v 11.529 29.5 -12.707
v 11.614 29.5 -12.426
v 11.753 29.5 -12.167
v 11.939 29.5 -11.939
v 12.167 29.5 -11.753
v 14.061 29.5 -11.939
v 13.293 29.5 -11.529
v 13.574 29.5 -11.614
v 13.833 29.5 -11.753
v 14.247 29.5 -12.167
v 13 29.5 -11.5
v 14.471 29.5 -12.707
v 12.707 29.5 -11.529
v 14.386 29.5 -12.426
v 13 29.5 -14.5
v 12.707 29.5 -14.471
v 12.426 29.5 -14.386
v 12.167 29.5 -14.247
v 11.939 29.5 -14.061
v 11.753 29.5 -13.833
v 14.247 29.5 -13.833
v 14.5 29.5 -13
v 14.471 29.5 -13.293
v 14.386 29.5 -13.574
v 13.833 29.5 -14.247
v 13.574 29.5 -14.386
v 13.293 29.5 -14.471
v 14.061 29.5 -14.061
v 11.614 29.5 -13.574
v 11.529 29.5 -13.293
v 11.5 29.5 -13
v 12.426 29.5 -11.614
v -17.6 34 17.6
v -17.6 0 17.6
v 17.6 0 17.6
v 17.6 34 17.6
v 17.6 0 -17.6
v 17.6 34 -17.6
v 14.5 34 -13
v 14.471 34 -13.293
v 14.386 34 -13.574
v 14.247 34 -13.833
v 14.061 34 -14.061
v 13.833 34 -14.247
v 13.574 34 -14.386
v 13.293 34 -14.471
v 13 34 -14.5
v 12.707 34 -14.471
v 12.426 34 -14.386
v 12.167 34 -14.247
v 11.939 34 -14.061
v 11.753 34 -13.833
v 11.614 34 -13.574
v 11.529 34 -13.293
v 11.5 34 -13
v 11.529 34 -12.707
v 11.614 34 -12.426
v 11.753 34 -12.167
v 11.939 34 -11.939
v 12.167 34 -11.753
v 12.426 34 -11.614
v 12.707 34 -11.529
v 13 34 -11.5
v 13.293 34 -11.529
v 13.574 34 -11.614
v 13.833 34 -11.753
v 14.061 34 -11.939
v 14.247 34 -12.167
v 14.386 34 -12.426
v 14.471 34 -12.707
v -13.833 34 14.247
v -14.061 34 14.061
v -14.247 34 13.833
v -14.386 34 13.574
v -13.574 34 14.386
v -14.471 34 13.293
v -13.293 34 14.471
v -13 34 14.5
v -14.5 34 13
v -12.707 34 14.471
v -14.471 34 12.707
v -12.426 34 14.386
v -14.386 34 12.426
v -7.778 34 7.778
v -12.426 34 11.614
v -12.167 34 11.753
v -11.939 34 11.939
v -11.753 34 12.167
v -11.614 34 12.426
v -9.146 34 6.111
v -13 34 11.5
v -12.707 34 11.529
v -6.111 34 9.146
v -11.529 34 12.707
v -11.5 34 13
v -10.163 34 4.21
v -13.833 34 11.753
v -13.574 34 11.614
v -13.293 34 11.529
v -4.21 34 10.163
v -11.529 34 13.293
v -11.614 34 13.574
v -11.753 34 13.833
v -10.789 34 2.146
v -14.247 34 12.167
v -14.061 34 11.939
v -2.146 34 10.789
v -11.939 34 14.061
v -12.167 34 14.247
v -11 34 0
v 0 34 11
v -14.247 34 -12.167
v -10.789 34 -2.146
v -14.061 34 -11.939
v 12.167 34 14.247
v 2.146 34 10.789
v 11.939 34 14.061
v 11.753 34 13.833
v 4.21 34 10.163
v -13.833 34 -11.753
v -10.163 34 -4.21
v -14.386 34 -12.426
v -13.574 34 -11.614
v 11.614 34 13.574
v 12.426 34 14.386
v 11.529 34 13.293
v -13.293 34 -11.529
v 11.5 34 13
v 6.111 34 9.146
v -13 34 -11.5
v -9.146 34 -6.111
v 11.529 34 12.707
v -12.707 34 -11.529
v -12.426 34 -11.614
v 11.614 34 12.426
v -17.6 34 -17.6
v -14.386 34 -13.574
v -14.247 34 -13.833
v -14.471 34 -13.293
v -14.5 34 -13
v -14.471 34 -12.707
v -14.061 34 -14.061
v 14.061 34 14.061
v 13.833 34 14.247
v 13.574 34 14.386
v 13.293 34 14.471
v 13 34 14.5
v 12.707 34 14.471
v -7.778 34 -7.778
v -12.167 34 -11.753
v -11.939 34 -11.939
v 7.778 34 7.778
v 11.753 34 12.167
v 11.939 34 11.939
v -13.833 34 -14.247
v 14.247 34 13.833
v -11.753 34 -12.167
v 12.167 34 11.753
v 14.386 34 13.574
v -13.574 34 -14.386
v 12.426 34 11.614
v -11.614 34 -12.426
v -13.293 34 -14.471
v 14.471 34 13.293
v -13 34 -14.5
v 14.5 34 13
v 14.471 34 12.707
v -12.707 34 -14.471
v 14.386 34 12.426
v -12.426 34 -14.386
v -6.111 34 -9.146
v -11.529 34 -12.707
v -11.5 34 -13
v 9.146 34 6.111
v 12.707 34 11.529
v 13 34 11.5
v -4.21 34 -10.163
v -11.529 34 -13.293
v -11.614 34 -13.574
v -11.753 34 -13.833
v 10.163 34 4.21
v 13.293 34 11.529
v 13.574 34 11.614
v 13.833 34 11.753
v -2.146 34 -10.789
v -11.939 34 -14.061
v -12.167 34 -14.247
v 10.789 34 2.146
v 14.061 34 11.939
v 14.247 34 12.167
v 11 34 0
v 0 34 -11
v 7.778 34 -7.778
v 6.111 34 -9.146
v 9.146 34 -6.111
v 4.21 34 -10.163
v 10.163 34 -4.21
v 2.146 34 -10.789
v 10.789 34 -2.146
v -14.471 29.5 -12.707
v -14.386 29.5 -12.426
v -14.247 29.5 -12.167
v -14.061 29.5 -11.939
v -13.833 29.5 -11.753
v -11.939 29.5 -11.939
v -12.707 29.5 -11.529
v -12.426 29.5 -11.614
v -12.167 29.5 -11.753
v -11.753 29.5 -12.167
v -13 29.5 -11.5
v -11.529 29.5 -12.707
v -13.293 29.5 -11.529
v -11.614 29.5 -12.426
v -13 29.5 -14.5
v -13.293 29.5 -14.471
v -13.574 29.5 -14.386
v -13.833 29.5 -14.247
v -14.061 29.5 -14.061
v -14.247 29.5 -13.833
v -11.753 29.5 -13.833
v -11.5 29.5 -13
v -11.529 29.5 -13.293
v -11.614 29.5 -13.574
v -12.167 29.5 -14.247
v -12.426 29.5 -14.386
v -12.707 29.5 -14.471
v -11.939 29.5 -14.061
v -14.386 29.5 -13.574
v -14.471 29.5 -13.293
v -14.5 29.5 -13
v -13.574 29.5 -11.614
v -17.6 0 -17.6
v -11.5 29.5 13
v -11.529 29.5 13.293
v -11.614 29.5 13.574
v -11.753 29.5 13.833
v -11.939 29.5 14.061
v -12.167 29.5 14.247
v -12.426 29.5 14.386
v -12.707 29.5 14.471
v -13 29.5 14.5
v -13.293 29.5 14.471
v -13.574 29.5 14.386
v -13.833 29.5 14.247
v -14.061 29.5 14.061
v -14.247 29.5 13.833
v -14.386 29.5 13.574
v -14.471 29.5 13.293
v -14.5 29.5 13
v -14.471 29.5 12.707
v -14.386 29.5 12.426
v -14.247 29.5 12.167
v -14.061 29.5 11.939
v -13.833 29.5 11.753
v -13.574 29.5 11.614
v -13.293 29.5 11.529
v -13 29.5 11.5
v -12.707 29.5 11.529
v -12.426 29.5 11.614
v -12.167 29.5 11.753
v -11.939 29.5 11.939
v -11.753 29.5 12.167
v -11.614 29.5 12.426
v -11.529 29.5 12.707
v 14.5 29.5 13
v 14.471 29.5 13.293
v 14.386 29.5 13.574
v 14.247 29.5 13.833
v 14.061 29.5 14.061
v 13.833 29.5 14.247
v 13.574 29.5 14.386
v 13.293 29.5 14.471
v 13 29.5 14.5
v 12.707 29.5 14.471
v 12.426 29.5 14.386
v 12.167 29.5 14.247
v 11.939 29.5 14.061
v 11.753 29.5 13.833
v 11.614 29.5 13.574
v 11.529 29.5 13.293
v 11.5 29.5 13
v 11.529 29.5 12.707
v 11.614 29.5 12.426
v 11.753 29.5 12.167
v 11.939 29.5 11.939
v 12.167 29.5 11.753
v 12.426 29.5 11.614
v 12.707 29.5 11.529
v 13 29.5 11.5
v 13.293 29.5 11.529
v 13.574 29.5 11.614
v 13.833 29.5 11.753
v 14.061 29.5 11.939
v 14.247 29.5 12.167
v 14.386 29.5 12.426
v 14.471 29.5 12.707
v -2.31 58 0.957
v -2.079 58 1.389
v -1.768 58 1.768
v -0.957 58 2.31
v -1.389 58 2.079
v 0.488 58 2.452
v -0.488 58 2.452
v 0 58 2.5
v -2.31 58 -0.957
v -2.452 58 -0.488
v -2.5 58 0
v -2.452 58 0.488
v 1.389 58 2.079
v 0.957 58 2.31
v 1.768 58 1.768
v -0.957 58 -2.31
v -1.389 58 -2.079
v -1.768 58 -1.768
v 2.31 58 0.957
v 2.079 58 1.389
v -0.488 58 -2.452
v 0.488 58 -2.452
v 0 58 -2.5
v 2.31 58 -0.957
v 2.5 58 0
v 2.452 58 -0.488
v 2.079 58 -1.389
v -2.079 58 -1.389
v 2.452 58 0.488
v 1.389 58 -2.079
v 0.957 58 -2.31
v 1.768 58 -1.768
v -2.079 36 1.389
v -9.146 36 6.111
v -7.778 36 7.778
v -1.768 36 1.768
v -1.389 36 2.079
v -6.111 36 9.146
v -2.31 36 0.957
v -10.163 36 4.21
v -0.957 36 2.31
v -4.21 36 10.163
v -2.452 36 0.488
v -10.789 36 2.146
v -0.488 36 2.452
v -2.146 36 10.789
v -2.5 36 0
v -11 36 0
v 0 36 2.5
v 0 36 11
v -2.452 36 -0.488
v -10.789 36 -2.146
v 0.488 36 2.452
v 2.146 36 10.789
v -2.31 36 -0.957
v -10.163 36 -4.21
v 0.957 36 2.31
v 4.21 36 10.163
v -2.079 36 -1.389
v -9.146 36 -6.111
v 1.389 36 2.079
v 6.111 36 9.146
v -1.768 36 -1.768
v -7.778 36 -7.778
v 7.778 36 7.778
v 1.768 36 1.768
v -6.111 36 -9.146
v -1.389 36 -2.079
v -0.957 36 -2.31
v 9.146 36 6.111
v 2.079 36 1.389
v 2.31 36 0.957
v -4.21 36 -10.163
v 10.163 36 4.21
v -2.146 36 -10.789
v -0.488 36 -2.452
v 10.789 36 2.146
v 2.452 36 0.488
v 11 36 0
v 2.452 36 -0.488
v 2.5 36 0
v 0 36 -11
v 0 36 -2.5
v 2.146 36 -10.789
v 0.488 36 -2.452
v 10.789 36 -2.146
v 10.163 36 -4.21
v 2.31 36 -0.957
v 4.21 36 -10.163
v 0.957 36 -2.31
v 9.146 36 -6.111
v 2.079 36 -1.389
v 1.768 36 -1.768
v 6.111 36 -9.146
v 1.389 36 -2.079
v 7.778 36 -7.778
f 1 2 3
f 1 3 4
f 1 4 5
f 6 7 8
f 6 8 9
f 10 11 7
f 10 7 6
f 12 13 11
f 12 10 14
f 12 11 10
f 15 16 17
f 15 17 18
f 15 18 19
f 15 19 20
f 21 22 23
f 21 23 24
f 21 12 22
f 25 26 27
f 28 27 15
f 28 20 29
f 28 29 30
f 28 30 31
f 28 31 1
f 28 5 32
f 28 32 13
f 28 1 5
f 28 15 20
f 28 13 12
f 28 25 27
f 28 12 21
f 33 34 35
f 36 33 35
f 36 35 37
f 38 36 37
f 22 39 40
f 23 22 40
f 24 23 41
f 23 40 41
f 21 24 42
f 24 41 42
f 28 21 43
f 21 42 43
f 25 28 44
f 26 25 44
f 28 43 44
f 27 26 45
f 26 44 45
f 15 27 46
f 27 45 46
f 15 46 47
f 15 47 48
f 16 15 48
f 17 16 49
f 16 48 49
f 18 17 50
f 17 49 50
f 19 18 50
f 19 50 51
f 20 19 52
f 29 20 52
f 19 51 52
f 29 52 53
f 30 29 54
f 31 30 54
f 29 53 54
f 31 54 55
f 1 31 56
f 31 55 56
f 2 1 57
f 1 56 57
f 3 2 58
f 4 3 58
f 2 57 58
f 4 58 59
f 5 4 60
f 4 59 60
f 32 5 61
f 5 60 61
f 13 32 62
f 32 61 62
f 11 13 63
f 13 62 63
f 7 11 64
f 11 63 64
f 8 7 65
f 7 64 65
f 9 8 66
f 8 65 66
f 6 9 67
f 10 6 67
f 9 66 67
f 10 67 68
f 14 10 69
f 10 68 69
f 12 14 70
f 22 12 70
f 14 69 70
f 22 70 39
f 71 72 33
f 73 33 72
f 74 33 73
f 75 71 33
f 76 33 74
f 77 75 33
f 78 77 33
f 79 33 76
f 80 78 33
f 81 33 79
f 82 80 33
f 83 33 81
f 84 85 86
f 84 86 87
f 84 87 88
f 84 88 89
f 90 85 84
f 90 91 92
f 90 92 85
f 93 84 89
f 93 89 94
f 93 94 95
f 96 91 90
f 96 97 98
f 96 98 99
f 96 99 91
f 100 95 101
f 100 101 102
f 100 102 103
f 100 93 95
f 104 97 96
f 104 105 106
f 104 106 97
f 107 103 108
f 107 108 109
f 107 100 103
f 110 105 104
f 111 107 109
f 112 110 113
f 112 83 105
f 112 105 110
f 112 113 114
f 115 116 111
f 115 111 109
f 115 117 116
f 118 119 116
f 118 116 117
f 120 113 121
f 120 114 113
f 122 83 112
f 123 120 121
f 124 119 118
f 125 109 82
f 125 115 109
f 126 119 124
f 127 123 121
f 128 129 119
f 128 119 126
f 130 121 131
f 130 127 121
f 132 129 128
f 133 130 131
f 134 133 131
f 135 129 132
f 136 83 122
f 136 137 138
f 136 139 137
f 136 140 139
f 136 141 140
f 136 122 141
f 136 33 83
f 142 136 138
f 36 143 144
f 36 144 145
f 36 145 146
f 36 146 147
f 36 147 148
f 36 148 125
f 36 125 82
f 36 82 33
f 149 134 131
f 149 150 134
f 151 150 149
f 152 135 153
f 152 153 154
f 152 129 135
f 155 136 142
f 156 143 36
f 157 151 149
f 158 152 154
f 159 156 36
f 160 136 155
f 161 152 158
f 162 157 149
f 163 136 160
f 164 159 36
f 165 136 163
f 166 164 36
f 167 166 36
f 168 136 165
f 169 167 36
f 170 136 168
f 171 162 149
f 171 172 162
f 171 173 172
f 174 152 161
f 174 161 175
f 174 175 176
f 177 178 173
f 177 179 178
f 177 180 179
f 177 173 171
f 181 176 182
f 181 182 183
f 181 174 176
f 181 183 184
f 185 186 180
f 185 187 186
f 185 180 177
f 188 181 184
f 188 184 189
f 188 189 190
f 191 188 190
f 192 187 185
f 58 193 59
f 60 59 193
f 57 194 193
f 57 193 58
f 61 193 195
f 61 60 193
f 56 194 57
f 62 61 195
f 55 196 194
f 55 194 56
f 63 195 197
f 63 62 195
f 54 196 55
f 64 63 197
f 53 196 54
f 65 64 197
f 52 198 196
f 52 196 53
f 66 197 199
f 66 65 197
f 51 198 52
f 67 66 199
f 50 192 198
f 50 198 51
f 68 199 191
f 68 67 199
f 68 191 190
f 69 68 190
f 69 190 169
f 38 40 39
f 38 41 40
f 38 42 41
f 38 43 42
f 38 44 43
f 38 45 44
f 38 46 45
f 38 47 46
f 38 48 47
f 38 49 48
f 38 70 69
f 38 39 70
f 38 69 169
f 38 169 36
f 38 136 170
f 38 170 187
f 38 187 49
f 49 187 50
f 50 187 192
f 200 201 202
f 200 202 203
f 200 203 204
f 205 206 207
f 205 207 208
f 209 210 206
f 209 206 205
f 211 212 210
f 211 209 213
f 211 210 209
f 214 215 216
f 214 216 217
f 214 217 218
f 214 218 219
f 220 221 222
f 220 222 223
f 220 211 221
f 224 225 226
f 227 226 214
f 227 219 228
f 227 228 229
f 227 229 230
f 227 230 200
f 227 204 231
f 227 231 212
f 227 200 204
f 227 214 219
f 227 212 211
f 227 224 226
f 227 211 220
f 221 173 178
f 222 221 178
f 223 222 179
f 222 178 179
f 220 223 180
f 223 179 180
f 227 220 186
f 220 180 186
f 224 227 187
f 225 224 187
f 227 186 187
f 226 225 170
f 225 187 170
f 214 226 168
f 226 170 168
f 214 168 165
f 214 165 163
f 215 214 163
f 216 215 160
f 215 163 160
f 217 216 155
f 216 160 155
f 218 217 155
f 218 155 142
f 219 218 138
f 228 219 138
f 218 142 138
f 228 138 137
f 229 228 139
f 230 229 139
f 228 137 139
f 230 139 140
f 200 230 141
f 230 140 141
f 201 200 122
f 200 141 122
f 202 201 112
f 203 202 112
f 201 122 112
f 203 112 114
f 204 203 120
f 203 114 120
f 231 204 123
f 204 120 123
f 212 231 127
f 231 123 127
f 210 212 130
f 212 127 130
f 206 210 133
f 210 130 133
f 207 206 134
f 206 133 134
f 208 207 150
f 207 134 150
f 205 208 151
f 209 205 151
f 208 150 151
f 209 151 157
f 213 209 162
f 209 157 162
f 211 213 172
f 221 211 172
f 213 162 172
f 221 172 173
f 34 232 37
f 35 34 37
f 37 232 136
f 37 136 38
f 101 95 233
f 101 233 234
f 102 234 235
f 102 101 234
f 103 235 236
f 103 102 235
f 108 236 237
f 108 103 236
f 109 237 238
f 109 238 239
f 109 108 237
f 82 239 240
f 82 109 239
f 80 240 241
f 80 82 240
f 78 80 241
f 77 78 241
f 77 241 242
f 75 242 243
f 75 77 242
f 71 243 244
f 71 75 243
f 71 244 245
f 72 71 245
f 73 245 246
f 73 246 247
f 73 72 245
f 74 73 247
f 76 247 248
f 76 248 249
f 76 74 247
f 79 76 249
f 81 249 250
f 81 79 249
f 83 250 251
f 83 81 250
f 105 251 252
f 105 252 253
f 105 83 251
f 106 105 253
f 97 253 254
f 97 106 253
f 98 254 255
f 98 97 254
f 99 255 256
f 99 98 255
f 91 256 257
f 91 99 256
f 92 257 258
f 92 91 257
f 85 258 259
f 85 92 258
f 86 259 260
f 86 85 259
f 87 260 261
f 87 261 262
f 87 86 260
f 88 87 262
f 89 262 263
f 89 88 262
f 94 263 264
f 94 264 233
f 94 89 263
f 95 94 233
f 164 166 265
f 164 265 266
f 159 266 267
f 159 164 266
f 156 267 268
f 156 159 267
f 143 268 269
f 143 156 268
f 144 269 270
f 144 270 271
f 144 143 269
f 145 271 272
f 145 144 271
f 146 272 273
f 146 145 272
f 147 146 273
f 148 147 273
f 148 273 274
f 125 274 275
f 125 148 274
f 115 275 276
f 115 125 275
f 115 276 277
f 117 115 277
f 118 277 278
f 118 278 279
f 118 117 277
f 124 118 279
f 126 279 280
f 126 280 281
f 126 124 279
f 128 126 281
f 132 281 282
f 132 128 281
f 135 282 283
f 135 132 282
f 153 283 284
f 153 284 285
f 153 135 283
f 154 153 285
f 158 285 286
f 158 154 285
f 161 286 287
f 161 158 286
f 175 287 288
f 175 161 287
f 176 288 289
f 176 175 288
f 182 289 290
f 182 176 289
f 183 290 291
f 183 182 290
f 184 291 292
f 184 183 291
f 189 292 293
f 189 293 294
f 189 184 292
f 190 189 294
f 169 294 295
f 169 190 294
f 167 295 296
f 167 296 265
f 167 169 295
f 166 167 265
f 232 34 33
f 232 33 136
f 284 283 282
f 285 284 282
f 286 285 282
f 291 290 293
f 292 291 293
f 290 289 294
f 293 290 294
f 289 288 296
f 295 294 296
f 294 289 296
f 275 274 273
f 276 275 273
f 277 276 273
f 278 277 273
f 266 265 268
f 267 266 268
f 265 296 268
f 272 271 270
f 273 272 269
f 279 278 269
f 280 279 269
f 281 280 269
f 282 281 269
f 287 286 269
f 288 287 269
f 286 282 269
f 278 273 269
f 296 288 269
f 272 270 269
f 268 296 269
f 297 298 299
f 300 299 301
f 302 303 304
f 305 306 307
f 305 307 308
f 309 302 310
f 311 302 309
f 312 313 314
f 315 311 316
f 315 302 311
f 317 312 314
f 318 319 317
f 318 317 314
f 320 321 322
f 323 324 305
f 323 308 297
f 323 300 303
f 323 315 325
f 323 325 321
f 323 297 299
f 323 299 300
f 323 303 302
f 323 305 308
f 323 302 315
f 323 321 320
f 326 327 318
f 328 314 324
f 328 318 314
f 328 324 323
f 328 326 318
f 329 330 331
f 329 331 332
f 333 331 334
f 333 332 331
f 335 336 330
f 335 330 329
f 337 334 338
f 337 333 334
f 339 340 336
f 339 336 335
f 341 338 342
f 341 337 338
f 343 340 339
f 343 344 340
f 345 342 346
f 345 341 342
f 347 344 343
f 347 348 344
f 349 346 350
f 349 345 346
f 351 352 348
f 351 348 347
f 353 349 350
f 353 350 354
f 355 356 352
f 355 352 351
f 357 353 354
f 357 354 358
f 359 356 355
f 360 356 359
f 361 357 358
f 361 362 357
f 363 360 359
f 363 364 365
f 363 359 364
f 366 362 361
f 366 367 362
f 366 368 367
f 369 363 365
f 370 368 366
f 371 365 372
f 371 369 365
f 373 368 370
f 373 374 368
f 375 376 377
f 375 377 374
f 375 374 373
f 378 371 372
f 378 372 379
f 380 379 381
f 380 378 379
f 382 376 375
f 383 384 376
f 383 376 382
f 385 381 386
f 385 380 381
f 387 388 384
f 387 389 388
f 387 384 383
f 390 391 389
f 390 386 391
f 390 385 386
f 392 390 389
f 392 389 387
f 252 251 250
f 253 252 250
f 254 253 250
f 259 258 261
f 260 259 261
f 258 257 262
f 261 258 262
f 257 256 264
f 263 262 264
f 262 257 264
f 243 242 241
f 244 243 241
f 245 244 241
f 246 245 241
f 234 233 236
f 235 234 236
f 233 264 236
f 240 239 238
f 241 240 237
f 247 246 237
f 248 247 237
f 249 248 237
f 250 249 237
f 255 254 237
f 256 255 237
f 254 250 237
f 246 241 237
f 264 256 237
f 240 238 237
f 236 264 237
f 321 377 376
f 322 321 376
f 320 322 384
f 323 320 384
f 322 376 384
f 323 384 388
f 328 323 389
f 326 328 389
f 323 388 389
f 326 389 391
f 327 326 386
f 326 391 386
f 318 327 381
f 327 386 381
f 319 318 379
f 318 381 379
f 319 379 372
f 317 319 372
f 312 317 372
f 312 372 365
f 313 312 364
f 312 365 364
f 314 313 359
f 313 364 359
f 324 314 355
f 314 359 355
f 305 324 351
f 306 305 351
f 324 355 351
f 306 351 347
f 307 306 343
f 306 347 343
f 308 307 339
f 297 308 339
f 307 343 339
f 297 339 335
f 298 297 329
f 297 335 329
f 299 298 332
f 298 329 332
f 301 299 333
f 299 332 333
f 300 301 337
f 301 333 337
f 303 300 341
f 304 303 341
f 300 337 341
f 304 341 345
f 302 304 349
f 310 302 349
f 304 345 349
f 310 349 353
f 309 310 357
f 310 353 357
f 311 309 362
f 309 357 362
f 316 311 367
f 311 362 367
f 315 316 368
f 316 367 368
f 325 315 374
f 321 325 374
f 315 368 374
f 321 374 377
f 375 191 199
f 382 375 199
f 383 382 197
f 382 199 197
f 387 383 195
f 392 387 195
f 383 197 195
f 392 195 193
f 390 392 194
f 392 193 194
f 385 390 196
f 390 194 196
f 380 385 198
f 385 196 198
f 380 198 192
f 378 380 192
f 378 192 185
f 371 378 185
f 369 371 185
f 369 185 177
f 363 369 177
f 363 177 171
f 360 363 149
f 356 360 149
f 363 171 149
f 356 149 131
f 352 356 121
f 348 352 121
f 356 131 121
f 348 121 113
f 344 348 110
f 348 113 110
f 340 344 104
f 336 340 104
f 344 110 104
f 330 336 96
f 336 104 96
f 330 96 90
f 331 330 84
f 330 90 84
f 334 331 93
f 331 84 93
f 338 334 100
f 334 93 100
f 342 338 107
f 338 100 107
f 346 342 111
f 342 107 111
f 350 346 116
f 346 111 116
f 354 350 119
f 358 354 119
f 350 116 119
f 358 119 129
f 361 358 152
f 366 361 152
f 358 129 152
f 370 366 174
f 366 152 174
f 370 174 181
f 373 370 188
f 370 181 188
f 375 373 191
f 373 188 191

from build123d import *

# Parameters (mm, degrees)
SKETCH1_W           = 35.2
SKETCH1_H           = 35.2
BOSS_EXTRUDE1_DEPTH = 34
SKETCH2_R           = 1.5
CUT_EXTRUDE1_DEPTH  = 4.5
SKETCH3_R           = 11
BOSS_EXTRUDE2_DEPTH = 2
SKETCH4_R           = 2.5
BOSS_EXTRUDE3_DEPTH = 22


with BuildPart() as part:
    # Sketch1 → Boss-Extrude1 (new body)
    with BuildSketch(Plane(origin=(0, 0, 0), x_dir=(1, 0, 0), z_dir=(0, 1, 0))):
        Rectangle(SKETCH1_W, SKETCH1_H)
    extrude(amount=BOSS_EXTRUDE1_DEPTH)

    # Sketch2 → Cut-Extrude1 (cut)
    with BuildSketch(Plane(origin=(0, 34, 0), x_dir=(1, 0, 0), z_dir=(0, 1, 0))):
        with Locations((-13, 13)):
            Circle(SKETCH2_R)
        with Locations((13, 13)):
            Circle(SKETCH2_R)
    cut_extrude1 = extrude(amount=-CUT_EXTRUDE1_DEPTH, mode=Mode.SUBTRACT)

    # Mirror1: Cut-Extrude1 across plane
    add(cut_extrude1.mirror(Plane.XY), mode=Mode.SUBTRACT)

    # Sketch3 → Boss-Extrude2 (add)
    with BuildSketch(Plane(origin=(0, 34, 0), x_dir=(1, 0, 0), z_dir=(0, 1, 0))):
        Circle(SKETCH3_R)
    extrude(amount=BOSS_EXTRUDE2_DEPTH)

    # Sketch4 → Boss-Extrude3 (add)
    with BuildSketch(Plane(origin=(0, 36, 0), x_dir=(1, 0, 0), z_dir=(0, 1, 0))):
        Circle(SKETCH4_R)
    extrude(amount=BOSS_EXTRUDE3_DEPTH)


solid = part.part
